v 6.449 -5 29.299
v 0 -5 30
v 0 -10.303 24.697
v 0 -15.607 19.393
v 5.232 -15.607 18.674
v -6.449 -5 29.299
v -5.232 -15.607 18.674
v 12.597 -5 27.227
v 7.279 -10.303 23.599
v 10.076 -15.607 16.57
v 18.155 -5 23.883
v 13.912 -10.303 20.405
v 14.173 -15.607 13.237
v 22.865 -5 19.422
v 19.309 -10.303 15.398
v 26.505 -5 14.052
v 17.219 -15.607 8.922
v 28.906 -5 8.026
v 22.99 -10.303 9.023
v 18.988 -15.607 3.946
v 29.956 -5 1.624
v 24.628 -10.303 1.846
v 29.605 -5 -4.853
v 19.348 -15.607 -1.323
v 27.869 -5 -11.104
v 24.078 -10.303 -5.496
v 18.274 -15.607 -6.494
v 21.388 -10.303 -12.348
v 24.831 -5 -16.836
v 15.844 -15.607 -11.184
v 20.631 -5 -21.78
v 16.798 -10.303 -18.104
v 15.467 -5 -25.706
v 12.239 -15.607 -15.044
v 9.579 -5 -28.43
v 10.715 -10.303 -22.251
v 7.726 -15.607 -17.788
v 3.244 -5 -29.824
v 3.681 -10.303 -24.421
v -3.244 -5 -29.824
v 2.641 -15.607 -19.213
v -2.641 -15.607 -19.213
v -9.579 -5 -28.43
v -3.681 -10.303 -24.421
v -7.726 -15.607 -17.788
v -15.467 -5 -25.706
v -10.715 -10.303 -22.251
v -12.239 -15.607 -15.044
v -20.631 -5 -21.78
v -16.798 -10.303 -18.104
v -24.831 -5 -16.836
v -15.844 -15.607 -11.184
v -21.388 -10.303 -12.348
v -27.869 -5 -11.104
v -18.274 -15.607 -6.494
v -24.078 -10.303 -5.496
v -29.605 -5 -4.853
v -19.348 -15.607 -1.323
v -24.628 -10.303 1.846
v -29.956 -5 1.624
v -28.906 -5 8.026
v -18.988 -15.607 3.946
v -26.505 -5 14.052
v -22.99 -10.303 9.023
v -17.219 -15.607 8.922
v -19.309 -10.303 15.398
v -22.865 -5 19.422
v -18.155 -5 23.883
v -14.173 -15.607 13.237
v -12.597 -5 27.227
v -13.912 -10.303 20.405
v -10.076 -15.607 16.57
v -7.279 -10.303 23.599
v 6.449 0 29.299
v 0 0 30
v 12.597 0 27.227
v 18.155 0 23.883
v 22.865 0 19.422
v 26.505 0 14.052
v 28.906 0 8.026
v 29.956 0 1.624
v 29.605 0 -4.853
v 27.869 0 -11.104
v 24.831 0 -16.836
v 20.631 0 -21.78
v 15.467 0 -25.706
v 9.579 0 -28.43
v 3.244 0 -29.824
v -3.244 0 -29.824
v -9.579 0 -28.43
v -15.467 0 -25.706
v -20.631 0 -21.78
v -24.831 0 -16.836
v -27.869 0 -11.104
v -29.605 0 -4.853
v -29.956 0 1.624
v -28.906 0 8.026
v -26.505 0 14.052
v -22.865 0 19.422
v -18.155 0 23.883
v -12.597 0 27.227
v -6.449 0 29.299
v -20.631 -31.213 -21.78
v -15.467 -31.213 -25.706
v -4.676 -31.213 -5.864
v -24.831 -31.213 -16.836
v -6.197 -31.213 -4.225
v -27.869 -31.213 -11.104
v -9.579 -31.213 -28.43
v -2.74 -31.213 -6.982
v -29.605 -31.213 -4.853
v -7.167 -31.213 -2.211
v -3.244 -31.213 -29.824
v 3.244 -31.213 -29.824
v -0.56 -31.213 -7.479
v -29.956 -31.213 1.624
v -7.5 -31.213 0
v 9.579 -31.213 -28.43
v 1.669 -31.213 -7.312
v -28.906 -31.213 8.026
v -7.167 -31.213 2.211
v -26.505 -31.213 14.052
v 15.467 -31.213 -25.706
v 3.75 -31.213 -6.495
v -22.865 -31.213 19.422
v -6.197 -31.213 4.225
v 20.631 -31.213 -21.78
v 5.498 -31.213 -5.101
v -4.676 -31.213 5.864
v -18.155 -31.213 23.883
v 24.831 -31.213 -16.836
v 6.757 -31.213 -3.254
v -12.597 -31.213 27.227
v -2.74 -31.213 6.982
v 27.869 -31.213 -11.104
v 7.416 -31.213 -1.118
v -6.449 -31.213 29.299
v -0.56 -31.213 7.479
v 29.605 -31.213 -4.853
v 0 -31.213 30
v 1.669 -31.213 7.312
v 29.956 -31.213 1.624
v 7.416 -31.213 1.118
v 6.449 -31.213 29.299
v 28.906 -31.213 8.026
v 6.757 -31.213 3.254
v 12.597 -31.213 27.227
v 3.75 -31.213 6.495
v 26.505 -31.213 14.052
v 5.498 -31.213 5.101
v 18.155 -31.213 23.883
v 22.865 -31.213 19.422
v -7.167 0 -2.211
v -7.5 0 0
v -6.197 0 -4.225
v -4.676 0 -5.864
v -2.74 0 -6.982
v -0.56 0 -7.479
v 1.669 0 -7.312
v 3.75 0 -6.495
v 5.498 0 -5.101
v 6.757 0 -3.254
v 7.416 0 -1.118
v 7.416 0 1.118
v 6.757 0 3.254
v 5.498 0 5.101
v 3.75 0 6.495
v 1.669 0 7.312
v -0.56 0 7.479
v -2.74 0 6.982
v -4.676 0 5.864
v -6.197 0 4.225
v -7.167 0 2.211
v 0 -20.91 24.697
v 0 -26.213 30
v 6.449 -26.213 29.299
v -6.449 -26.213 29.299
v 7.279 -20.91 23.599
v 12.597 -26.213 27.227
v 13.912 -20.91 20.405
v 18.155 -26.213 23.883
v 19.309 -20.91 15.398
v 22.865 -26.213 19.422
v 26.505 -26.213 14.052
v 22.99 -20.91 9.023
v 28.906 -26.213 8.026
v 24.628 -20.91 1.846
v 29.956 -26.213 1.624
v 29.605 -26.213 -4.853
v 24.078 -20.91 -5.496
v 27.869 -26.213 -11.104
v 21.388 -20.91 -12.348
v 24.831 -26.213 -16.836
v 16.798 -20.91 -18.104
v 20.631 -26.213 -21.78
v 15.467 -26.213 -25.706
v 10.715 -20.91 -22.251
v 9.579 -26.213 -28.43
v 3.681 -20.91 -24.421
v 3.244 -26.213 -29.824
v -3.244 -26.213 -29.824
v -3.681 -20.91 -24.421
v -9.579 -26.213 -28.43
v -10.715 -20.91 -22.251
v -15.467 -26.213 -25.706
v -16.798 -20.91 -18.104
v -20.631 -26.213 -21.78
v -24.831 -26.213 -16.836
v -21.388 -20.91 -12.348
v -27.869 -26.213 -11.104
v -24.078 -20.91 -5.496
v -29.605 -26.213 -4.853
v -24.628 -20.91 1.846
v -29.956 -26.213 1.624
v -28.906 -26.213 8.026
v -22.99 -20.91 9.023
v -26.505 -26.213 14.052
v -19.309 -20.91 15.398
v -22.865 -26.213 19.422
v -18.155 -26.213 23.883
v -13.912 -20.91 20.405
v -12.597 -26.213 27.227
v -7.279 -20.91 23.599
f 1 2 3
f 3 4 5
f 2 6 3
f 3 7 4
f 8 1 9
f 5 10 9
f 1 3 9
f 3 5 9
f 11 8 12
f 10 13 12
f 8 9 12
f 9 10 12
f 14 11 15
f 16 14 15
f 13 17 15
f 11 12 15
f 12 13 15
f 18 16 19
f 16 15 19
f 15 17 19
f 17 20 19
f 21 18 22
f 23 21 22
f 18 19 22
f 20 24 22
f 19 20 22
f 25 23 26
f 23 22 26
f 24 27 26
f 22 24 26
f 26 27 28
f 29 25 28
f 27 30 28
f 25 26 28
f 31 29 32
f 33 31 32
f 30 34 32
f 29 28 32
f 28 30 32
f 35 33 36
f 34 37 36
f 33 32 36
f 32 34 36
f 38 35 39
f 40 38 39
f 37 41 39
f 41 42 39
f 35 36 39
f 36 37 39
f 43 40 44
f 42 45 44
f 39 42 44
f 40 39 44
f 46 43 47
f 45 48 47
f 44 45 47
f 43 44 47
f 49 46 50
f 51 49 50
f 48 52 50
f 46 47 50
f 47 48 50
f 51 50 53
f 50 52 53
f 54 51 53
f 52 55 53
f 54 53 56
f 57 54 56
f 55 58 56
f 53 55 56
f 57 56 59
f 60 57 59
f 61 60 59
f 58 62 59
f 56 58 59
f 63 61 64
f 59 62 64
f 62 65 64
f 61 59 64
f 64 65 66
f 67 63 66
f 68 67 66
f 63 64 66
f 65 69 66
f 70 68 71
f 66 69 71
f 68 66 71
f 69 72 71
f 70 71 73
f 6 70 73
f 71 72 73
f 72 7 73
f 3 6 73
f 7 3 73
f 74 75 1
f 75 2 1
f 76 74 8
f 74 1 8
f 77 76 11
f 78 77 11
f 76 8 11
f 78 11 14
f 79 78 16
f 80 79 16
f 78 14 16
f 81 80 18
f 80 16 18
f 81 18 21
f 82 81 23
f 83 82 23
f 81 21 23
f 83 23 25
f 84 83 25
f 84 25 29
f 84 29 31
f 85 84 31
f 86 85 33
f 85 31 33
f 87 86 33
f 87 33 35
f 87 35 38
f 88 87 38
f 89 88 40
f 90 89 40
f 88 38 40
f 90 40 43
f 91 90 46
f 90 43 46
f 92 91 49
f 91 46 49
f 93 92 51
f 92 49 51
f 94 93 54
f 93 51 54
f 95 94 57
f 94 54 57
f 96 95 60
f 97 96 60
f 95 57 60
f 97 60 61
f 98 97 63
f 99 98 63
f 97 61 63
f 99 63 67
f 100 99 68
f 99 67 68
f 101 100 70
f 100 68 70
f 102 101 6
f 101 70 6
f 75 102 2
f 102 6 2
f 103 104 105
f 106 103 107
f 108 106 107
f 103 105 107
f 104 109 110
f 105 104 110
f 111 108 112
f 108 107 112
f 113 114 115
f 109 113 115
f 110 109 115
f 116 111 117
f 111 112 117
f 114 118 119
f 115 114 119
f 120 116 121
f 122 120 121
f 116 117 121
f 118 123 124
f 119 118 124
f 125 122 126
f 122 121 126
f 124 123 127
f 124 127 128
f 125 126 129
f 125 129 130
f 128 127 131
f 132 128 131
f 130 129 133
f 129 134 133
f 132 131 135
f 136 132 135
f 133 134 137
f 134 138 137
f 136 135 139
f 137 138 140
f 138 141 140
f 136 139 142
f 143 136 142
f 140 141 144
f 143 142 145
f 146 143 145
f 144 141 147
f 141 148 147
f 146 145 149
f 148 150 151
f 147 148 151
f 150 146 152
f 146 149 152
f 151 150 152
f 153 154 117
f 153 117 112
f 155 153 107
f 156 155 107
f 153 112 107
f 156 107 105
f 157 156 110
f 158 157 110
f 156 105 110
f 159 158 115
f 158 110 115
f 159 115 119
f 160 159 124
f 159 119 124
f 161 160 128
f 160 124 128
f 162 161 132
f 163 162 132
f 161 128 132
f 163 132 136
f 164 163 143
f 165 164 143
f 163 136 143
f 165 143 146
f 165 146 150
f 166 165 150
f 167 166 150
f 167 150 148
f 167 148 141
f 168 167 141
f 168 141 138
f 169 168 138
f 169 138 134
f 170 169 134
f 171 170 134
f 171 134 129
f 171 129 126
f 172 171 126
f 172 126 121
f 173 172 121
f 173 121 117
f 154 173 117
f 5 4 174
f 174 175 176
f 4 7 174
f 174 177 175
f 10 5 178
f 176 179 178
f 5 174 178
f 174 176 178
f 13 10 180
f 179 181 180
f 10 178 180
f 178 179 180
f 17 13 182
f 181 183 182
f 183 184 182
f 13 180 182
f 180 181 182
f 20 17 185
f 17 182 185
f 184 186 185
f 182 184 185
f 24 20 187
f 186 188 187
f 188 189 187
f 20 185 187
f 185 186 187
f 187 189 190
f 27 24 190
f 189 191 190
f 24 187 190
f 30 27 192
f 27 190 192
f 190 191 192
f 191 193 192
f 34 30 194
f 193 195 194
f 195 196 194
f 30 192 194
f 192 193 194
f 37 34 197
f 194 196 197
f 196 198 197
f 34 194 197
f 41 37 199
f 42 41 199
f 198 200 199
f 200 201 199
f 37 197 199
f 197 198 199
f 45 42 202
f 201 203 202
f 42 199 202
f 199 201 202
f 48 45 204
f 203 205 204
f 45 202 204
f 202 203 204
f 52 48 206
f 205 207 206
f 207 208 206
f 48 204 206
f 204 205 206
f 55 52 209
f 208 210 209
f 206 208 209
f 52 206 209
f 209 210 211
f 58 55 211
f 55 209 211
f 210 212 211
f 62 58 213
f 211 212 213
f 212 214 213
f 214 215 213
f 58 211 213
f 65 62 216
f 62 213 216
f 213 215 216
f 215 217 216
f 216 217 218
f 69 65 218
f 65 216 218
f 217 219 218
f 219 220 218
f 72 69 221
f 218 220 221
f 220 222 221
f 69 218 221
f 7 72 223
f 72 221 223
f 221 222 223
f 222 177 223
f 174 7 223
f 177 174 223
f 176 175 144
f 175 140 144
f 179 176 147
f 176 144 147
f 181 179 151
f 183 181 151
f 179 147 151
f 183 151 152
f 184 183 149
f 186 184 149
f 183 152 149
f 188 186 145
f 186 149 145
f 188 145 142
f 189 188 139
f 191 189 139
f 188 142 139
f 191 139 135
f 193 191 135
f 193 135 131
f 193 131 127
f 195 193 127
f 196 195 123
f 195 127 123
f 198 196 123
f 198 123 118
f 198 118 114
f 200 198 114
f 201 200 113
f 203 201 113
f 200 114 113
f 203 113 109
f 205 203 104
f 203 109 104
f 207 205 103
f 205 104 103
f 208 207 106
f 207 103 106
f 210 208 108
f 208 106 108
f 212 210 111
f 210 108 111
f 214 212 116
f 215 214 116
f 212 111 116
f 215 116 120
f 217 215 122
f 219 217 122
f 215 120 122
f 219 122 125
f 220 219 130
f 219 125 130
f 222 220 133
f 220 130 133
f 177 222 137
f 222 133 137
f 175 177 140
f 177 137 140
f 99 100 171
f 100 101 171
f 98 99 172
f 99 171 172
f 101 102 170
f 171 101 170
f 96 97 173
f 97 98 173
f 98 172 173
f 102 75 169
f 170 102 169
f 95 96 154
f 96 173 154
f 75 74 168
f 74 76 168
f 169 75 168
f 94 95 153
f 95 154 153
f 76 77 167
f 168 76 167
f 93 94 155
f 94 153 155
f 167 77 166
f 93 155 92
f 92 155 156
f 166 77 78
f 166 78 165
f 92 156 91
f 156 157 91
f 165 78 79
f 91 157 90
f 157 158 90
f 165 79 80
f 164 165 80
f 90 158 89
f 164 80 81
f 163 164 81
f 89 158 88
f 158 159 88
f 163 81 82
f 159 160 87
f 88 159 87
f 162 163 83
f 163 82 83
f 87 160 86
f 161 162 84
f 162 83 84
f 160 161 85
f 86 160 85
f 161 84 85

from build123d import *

# Parameters (mm, degrees)
F3_D = 15


with BuildPart() as f1:
    # F0 (on Right) → F1 (revolve)
    with BuildSketch(Plane.YZ):
        Polygon((-31.213203, 0), (0, 0), (0, 30), (-5, 30), (-15.606602, 19.393398), (-26.213203, 30), (-31.213203, 30), align=None)
    revolve(axis=Axis((0, -15.606602, 0), (0, 1, 0)))

    # F3 (through all)
    with Locations(Plane(origin=(0, 0, 0), x_dir=(1, 0, 0), z_dir=(0, 1, 0))):
        with Locations((0, 0)):
            Hole(F3_D / 2)


solid = f1.part
